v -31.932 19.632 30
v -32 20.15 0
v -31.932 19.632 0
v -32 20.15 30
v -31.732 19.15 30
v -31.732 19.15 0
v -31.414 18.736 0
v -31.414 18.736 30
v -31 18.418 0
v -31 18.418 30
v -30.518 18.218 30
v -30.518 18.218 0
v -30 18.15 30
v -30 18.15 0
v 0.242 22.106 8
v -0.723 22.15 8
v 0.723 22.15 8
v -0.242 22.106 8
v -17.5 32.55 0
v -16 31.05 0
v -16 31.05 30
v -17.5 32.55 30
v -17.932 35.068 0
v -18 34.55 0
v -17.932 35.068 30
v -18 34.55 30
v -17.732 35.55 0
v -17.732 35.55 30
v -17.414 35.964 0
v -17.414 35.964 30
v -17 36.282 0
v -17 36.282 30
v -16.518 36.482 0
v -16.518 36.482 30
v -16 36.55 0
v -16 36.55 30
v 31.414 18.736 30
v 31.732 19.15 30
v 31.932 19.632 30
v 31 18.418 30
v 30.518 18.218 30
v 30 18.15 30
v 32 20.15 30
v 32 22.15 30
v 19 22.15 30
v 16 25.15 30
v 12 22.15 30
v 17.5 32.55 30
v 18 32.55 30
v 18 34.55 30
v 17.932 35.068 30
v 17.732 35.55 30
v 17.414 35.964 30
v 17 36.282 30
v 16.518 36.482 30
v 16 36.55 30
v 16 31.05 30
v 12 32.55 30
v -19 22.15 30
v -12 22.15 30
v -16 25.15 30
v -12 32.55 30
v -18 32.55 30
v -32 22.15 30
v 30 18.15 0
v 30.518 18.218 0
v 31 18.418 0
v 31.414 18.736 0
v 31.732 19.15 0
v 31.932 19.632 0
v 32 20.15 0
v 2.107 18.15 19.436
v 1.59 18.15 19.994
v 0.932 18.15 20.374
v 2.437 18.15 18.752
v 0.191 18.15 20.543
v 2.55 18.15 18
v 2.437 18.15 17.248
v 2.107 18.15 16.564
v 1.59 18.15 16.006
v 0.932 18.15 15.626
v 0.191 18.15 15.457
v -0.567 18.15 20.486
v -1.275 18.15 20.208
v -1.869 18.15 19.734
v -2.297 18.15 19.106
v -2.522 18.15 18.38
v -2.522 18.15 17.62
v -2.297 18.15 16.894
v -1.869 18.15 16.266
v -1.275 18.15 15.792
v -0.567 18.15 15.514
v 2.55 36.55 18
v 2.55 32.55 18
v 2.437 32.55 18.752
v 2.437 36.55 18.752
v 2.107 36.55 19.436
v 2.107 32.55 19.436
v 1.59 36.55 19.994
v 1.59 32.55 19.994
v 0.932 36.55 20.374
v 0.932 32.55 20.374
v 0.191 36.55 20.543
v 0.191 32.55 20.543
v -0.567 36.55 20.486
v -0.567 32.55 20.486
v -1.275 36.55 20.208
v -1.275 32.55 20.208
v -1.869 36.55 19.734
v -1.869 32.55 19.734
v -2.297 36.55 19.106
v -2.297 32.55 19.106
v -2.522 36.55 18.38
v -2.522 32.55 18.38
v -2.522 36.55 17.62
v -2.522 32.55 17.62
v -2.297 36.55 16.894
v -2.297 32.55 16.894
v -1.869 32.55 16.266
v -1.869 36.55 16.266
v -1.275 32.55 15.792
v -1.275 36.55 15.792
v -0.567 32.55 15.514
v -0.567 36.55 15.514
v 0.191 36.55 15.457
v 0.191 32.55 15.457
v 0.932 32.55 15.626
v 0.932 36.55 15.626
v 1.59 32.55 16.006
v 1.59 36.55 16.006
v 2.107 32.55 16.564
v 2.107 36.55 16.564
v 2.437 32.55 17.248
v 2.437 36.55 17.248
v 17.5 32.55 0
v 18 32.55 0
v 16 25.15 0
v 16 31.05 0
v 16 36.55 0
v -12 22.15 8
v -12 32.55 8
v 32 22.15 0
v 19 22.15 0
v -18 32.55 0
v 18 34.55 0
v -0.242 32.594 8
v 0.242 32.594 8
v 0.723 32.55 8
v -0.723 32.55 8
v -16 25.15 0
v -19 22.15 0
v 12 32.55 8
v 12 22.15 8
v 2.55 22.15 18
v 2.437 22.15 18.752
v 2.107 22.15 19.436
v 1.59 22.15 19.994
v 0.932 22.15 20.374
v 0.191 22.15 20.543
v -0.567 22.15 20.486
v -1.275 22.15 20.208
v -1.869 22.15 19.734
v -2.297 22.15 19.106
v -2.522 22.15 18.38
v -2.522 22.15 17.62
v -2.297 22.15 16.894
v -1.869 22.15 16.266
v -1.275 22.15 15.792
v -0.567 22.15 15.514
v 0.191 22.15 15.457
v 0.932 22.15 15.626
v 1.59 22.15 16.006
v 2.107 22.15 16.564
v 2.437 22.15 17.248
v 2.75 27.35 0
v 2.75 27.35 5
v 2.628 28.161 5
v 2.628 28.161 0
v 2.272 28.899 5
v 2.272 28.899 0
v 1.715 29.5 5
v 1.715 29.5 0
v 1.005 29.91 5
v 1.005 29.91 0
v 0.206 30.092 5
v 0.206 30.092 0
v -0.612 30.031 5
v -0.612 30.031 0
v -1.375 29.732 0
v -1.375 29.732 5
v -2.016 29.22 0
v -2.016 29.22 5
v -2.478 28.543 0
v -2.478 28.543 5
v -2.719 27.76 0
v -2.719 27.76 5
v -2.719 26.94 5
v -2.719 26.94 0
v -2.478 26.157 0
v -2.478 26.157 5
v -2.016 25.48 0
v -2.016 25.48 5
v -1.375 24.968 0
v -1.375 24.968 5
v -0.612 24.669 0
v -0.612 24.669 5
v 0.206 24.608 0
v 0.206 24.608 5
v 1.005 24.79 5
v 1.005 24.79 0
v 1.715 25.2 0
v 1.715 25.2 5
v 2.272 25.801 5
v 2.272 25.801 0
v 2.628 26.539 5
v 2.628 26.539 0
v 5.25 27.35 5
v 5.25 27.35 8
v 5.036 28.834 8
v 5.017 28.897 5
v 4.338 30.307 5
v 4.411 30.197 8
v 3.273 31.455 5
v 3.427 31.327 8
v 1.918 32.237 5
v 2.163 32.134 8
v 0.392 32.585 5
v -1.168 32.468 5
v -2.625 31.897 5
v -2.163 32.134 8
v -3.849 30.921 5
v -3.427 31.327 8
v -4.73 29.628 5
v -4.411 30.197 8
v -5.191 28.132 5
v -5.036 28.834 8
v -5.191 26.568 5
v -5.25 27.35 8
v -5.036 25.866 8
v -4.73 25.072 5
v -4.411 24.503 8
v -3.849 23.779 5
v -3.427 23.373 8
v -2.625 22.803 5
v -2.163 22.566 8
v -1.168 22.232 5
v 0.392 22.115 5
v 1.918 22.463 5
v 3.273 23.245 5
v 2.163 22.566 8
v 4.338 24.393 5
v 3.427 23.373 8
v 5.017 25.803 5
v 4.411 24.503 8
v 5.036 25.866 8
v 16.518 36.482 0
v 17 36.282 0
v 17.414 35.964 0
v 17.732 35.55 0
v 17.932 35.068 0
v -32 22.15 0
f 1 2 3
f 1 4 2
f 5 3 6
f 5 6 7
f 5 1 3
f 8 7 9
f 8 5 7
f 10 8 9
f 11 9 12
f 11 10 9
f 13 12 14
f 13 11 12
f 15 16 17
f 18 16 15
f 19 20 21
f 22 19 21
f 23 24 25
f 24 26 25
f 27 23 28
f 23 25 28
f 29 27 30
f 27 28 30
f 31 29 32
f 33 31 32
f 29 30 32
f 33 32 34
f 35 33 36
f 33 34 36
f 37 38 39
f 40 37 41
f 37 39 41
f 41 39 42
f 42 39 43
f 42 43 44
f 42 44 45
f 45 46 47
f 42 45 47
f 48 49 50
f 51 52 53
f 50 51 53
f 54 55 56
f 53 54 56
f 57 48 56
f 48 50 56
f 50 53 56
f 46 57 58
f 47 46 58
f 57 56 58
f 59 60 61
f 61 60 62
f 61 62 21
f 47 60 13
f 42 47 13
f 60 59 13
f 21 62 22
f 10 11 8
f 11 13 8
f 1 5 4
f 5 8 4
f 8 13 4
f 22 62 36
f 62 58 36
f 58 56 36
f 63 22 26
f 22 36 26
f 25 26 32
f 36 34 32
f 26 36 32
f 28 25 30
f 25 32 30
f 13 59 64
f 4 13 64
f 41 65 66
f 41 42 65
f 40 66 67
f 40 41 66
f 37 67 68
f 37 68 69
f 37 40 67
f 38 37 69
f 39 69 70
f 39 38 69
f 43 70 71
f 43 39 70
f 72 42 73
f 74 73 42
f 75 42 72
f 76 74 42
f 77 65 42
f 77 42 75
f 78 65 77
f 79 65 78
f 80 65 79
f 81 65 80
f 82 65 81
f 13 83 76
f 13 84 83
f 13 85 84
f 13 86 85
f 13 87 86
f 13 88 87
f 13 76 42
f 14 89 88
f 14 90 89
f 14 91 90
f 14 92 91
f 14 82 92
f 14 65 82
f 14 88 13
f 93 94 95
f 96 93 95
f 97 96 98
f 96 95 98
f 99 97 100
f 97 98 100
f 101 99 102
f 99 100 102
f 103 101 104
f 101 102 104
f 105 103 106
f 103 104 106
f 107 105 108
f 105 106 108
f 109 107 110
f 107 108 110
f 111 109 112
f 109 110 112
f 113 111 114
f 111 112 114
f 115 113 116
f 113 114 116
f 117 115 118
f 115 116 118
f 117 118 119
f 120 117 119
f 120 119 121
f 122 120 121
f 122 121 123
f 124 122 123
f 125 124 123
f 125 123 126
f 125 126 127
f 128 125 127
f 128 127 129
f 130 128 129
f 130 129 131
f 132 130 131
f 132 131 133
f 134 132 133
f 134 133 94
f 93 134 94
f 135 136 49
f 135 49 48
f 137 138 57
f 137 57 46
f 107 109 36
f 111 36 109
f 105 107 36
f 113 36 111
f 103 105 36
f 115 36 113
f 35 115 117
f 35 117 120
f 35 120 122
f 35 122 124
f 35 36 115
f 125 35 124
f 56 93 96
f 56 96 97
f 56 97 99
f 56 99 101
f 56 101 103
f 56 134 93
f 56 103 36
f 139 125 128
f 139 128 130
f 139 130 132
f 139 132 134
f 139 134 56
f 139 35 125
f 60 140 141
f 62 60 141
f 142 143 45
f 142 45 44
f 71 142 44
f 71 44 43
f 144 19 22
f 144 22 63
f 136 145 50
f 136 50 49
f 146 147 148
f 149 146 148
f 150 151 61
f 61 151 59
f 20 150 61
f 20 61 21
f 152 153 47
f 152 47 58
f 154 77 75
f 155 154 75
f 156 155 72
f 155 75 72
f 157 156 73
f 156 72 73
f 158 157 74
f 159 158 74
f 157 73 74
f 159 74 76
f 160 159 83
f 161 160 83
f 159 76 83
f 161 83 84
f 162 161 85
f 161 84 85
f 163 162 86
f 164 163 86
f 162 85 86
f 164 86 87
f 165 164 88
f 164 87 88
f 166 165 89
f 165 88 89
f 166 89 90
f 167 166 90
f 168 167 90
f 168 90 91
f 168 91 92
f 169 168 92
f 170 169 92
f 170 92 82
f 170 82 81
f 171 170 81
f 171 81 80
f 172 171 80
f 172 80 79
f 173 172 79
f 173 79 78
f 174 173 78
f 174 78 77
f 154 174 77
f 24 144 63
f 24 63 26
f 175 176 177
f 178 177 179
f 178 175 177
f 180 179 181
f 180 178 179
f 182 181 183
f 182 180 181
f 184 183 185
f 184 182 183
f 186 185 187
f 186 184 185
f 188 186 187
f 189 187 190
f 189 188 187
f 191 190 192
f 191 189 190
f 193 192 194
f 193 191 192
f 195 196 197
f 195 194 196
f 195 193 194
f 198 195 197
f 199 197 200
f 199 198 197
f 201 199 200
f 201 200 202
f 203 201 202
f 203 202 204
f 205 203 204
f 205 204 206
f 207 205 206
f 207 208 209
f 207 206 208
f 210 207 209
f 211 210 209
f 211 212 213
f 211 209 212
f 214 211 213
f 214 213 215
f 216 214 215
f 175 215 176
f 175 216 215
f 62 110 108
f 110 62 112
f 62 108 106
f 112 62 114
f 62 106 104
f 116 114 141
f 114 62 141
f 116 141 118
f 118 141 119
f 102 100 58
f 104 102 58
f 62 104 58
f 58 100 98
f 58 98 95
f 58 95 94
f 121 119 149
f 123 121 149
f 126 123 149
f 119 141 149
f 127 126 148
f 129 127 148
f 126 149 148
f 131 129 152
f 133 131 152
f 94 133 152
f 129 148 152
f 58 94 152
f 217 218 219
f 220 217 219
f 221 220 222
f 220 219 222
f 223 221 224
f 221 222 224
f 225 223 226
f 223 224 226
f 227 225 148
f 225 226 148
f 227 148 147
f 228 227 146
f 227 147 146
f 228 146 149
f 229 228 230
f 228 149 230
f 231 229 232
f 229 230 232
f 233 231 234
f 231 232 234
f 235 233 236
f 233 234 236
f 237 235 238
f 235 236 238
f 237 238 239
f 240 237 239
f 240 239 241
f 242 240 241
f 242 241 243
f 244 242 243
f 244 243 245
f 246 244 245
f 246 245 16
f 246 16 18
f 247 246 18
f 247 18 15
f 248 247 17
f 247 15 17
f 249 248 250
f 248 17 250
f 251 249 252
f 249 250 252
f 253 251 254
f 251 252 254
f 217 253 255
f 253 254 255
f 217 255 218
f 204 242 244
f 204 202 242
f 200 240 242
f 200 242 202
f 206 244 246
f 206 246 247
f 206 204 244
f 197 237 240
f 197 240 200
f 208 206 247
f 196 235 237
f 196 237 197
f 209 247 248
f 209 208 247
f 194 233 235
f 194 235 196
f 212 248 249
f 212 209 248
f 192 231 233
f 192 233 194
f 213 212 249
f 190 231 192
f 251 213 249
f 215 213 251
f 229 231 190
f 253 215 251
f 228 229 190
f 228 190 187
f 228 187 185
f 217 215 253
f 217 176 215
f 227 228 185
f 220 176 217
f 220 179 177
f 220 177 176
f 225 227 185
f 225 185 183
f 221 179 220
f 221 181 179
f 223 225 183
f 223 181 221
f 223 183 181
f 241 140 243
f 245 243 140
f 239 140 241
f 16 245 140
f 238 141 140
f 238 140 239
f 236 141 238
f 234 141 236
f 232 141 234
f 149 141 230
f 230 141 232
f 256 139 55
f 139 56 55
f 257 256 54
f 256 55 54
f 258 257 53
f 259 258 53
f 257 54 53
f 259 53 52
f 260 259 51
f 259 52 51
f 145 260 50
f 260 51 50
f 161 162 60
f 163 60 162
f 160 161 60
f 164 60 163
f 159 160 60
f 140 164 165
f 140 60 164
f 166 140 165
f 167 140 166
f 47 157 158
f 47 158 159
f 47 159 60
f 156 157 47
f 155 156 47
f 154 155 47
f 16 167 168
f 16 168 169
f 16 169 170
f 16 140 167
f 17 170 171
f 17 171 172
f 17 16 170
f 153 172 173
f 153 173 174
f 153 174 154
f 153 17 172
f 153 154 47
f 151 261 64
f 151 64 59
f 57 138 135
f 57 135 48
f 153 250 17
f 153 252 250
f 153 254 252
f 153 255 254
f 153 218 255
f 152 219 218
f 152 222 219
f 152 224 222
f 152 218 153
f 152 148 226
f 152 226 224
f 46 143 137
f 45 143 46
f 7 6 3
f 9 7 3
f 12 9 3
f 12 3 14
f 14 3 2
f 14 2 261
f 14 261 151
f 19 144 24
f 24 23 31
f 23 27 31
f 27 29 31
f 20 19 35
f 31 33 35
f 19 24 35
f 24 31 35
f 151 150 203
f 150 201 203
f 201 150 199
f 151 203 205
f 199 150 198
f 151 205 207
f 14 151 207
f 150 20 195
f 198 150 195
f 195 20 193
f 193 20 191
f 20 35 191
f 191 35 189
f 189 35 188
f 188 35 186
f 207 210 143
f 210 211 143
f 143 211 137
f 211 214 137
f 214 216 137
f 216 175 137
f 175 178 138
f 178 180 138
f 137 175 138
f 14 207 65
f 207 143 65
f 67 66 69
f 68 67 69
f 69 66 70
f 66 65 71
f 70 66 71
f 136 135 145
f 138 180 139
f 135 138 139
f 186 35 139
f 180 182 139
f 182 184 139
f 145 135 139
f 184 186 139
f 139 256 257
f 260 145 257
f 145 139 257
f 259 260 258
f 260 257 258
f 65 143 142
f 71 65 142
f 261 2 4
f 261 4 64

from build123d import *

# Parameters (mm, degrees)
SKETCH173_W     = 24
SKETCH173_H     = 10.4
PAD043_DEPTH    = 30
SKETCH174_W     = 24
SKETCH174_H     = 10.4
PAD044_DEPTH    = 8
SKETCH175_R     = 2.75
POCKET095_DEPTH = 8
SKETCH176_R     = 5.25
POCKET096_DEPTH = 3
SKETCH177_R     = 2.55
POCKET097_DEPTH = 36.551
CHAMFER072_SIZE = 3
FILLET045_R     = 2
CHAMFER073_SIZE = 1.5


with BuildPart() as part:
    # Sketch173 → Pad043 (new body)
    with BuildSketch(Plane.XY):
        Polygon((-18, 36.55), (18, 36.55), (18, 32.55), (16, 32.55), (16, 22.15), (32, 22.15), (32, 18.15), (-32, 18.15), (-32, 22.15), (-16, 22.15), (-16, 32.55), (-18, 32.55), align=None)
        with Locations((0, 27.35)):
            Rectangle(SKETCH173_W, SKETCH173_H, mode=Mode.SUBTRACT)
    extrude(amount=PAD043_DEPTH)

    # Sketch174 → Pad044 (join)
    with BuildSketch(Plane.XY):
        with Locations((0, 27.35)):
            Rectangle(SKETCH174_W, SKETCH174_H)
    extrude(amount=PAD044_DEPTH)

    # Sketch175 → Pocket095 (cut)
    with BuildSketch(Plane.XY):
        with Locations((0, 27.35)):
            Circle(SKETCH175_R)
    extrude(amount=POCKET095_DEPTH, mode=Mode.SUBTRACT)

    # Sketch176 → Pocket096 (cut)
    with BuildSketch(Plane.XY.offset(8)):
        with Locations((0, 27.35)):
            Circle(SKETCH176_R)
    extrude(amount=-POCKET096_DEPTH, mode=Mode.SUBTRACT)

    # Sketch177 → Pocket097 (cut, through all)
    with BuildSketch(Plane.XZ):
        with Locations((0, 18)):
            Circle(SKETCH177_R)
    extrude(amount=-POCKET097_DEPTH, mode=Mode.SUBTRACT)

    # Chamfer072
    chamfer072_edges = [part.edges().sort_by_distance(p)[0] for p in [
        (-16, 22.15, 15),
        (16, 22.15, 15),
    ]]
    chamfer(chamfer072_edges, length=CHAMFER072_SIZE)

    # Fillet045
    fillet045_edges = [part.edges().sort_by_distance(p)[0] for p in [
        (-18, 36.55, 15),
        (18, 36.55, 15),
        (-32, 18.15, 15),
        (32, 18.15, 15),
    ]]
    fillet(fillet045_edges, radius=FILLET045_R)

    # Chamfer073
    chamfer073_edges = [part.edges().sort_by_distance(p)[0] for p in [
        (-16, 32.55, 15),
        (16, 32.55, 15),
    ]]
    chamfer(chamfer073_edges, length=CHAMFER073_SIZE)


solid = part.part
